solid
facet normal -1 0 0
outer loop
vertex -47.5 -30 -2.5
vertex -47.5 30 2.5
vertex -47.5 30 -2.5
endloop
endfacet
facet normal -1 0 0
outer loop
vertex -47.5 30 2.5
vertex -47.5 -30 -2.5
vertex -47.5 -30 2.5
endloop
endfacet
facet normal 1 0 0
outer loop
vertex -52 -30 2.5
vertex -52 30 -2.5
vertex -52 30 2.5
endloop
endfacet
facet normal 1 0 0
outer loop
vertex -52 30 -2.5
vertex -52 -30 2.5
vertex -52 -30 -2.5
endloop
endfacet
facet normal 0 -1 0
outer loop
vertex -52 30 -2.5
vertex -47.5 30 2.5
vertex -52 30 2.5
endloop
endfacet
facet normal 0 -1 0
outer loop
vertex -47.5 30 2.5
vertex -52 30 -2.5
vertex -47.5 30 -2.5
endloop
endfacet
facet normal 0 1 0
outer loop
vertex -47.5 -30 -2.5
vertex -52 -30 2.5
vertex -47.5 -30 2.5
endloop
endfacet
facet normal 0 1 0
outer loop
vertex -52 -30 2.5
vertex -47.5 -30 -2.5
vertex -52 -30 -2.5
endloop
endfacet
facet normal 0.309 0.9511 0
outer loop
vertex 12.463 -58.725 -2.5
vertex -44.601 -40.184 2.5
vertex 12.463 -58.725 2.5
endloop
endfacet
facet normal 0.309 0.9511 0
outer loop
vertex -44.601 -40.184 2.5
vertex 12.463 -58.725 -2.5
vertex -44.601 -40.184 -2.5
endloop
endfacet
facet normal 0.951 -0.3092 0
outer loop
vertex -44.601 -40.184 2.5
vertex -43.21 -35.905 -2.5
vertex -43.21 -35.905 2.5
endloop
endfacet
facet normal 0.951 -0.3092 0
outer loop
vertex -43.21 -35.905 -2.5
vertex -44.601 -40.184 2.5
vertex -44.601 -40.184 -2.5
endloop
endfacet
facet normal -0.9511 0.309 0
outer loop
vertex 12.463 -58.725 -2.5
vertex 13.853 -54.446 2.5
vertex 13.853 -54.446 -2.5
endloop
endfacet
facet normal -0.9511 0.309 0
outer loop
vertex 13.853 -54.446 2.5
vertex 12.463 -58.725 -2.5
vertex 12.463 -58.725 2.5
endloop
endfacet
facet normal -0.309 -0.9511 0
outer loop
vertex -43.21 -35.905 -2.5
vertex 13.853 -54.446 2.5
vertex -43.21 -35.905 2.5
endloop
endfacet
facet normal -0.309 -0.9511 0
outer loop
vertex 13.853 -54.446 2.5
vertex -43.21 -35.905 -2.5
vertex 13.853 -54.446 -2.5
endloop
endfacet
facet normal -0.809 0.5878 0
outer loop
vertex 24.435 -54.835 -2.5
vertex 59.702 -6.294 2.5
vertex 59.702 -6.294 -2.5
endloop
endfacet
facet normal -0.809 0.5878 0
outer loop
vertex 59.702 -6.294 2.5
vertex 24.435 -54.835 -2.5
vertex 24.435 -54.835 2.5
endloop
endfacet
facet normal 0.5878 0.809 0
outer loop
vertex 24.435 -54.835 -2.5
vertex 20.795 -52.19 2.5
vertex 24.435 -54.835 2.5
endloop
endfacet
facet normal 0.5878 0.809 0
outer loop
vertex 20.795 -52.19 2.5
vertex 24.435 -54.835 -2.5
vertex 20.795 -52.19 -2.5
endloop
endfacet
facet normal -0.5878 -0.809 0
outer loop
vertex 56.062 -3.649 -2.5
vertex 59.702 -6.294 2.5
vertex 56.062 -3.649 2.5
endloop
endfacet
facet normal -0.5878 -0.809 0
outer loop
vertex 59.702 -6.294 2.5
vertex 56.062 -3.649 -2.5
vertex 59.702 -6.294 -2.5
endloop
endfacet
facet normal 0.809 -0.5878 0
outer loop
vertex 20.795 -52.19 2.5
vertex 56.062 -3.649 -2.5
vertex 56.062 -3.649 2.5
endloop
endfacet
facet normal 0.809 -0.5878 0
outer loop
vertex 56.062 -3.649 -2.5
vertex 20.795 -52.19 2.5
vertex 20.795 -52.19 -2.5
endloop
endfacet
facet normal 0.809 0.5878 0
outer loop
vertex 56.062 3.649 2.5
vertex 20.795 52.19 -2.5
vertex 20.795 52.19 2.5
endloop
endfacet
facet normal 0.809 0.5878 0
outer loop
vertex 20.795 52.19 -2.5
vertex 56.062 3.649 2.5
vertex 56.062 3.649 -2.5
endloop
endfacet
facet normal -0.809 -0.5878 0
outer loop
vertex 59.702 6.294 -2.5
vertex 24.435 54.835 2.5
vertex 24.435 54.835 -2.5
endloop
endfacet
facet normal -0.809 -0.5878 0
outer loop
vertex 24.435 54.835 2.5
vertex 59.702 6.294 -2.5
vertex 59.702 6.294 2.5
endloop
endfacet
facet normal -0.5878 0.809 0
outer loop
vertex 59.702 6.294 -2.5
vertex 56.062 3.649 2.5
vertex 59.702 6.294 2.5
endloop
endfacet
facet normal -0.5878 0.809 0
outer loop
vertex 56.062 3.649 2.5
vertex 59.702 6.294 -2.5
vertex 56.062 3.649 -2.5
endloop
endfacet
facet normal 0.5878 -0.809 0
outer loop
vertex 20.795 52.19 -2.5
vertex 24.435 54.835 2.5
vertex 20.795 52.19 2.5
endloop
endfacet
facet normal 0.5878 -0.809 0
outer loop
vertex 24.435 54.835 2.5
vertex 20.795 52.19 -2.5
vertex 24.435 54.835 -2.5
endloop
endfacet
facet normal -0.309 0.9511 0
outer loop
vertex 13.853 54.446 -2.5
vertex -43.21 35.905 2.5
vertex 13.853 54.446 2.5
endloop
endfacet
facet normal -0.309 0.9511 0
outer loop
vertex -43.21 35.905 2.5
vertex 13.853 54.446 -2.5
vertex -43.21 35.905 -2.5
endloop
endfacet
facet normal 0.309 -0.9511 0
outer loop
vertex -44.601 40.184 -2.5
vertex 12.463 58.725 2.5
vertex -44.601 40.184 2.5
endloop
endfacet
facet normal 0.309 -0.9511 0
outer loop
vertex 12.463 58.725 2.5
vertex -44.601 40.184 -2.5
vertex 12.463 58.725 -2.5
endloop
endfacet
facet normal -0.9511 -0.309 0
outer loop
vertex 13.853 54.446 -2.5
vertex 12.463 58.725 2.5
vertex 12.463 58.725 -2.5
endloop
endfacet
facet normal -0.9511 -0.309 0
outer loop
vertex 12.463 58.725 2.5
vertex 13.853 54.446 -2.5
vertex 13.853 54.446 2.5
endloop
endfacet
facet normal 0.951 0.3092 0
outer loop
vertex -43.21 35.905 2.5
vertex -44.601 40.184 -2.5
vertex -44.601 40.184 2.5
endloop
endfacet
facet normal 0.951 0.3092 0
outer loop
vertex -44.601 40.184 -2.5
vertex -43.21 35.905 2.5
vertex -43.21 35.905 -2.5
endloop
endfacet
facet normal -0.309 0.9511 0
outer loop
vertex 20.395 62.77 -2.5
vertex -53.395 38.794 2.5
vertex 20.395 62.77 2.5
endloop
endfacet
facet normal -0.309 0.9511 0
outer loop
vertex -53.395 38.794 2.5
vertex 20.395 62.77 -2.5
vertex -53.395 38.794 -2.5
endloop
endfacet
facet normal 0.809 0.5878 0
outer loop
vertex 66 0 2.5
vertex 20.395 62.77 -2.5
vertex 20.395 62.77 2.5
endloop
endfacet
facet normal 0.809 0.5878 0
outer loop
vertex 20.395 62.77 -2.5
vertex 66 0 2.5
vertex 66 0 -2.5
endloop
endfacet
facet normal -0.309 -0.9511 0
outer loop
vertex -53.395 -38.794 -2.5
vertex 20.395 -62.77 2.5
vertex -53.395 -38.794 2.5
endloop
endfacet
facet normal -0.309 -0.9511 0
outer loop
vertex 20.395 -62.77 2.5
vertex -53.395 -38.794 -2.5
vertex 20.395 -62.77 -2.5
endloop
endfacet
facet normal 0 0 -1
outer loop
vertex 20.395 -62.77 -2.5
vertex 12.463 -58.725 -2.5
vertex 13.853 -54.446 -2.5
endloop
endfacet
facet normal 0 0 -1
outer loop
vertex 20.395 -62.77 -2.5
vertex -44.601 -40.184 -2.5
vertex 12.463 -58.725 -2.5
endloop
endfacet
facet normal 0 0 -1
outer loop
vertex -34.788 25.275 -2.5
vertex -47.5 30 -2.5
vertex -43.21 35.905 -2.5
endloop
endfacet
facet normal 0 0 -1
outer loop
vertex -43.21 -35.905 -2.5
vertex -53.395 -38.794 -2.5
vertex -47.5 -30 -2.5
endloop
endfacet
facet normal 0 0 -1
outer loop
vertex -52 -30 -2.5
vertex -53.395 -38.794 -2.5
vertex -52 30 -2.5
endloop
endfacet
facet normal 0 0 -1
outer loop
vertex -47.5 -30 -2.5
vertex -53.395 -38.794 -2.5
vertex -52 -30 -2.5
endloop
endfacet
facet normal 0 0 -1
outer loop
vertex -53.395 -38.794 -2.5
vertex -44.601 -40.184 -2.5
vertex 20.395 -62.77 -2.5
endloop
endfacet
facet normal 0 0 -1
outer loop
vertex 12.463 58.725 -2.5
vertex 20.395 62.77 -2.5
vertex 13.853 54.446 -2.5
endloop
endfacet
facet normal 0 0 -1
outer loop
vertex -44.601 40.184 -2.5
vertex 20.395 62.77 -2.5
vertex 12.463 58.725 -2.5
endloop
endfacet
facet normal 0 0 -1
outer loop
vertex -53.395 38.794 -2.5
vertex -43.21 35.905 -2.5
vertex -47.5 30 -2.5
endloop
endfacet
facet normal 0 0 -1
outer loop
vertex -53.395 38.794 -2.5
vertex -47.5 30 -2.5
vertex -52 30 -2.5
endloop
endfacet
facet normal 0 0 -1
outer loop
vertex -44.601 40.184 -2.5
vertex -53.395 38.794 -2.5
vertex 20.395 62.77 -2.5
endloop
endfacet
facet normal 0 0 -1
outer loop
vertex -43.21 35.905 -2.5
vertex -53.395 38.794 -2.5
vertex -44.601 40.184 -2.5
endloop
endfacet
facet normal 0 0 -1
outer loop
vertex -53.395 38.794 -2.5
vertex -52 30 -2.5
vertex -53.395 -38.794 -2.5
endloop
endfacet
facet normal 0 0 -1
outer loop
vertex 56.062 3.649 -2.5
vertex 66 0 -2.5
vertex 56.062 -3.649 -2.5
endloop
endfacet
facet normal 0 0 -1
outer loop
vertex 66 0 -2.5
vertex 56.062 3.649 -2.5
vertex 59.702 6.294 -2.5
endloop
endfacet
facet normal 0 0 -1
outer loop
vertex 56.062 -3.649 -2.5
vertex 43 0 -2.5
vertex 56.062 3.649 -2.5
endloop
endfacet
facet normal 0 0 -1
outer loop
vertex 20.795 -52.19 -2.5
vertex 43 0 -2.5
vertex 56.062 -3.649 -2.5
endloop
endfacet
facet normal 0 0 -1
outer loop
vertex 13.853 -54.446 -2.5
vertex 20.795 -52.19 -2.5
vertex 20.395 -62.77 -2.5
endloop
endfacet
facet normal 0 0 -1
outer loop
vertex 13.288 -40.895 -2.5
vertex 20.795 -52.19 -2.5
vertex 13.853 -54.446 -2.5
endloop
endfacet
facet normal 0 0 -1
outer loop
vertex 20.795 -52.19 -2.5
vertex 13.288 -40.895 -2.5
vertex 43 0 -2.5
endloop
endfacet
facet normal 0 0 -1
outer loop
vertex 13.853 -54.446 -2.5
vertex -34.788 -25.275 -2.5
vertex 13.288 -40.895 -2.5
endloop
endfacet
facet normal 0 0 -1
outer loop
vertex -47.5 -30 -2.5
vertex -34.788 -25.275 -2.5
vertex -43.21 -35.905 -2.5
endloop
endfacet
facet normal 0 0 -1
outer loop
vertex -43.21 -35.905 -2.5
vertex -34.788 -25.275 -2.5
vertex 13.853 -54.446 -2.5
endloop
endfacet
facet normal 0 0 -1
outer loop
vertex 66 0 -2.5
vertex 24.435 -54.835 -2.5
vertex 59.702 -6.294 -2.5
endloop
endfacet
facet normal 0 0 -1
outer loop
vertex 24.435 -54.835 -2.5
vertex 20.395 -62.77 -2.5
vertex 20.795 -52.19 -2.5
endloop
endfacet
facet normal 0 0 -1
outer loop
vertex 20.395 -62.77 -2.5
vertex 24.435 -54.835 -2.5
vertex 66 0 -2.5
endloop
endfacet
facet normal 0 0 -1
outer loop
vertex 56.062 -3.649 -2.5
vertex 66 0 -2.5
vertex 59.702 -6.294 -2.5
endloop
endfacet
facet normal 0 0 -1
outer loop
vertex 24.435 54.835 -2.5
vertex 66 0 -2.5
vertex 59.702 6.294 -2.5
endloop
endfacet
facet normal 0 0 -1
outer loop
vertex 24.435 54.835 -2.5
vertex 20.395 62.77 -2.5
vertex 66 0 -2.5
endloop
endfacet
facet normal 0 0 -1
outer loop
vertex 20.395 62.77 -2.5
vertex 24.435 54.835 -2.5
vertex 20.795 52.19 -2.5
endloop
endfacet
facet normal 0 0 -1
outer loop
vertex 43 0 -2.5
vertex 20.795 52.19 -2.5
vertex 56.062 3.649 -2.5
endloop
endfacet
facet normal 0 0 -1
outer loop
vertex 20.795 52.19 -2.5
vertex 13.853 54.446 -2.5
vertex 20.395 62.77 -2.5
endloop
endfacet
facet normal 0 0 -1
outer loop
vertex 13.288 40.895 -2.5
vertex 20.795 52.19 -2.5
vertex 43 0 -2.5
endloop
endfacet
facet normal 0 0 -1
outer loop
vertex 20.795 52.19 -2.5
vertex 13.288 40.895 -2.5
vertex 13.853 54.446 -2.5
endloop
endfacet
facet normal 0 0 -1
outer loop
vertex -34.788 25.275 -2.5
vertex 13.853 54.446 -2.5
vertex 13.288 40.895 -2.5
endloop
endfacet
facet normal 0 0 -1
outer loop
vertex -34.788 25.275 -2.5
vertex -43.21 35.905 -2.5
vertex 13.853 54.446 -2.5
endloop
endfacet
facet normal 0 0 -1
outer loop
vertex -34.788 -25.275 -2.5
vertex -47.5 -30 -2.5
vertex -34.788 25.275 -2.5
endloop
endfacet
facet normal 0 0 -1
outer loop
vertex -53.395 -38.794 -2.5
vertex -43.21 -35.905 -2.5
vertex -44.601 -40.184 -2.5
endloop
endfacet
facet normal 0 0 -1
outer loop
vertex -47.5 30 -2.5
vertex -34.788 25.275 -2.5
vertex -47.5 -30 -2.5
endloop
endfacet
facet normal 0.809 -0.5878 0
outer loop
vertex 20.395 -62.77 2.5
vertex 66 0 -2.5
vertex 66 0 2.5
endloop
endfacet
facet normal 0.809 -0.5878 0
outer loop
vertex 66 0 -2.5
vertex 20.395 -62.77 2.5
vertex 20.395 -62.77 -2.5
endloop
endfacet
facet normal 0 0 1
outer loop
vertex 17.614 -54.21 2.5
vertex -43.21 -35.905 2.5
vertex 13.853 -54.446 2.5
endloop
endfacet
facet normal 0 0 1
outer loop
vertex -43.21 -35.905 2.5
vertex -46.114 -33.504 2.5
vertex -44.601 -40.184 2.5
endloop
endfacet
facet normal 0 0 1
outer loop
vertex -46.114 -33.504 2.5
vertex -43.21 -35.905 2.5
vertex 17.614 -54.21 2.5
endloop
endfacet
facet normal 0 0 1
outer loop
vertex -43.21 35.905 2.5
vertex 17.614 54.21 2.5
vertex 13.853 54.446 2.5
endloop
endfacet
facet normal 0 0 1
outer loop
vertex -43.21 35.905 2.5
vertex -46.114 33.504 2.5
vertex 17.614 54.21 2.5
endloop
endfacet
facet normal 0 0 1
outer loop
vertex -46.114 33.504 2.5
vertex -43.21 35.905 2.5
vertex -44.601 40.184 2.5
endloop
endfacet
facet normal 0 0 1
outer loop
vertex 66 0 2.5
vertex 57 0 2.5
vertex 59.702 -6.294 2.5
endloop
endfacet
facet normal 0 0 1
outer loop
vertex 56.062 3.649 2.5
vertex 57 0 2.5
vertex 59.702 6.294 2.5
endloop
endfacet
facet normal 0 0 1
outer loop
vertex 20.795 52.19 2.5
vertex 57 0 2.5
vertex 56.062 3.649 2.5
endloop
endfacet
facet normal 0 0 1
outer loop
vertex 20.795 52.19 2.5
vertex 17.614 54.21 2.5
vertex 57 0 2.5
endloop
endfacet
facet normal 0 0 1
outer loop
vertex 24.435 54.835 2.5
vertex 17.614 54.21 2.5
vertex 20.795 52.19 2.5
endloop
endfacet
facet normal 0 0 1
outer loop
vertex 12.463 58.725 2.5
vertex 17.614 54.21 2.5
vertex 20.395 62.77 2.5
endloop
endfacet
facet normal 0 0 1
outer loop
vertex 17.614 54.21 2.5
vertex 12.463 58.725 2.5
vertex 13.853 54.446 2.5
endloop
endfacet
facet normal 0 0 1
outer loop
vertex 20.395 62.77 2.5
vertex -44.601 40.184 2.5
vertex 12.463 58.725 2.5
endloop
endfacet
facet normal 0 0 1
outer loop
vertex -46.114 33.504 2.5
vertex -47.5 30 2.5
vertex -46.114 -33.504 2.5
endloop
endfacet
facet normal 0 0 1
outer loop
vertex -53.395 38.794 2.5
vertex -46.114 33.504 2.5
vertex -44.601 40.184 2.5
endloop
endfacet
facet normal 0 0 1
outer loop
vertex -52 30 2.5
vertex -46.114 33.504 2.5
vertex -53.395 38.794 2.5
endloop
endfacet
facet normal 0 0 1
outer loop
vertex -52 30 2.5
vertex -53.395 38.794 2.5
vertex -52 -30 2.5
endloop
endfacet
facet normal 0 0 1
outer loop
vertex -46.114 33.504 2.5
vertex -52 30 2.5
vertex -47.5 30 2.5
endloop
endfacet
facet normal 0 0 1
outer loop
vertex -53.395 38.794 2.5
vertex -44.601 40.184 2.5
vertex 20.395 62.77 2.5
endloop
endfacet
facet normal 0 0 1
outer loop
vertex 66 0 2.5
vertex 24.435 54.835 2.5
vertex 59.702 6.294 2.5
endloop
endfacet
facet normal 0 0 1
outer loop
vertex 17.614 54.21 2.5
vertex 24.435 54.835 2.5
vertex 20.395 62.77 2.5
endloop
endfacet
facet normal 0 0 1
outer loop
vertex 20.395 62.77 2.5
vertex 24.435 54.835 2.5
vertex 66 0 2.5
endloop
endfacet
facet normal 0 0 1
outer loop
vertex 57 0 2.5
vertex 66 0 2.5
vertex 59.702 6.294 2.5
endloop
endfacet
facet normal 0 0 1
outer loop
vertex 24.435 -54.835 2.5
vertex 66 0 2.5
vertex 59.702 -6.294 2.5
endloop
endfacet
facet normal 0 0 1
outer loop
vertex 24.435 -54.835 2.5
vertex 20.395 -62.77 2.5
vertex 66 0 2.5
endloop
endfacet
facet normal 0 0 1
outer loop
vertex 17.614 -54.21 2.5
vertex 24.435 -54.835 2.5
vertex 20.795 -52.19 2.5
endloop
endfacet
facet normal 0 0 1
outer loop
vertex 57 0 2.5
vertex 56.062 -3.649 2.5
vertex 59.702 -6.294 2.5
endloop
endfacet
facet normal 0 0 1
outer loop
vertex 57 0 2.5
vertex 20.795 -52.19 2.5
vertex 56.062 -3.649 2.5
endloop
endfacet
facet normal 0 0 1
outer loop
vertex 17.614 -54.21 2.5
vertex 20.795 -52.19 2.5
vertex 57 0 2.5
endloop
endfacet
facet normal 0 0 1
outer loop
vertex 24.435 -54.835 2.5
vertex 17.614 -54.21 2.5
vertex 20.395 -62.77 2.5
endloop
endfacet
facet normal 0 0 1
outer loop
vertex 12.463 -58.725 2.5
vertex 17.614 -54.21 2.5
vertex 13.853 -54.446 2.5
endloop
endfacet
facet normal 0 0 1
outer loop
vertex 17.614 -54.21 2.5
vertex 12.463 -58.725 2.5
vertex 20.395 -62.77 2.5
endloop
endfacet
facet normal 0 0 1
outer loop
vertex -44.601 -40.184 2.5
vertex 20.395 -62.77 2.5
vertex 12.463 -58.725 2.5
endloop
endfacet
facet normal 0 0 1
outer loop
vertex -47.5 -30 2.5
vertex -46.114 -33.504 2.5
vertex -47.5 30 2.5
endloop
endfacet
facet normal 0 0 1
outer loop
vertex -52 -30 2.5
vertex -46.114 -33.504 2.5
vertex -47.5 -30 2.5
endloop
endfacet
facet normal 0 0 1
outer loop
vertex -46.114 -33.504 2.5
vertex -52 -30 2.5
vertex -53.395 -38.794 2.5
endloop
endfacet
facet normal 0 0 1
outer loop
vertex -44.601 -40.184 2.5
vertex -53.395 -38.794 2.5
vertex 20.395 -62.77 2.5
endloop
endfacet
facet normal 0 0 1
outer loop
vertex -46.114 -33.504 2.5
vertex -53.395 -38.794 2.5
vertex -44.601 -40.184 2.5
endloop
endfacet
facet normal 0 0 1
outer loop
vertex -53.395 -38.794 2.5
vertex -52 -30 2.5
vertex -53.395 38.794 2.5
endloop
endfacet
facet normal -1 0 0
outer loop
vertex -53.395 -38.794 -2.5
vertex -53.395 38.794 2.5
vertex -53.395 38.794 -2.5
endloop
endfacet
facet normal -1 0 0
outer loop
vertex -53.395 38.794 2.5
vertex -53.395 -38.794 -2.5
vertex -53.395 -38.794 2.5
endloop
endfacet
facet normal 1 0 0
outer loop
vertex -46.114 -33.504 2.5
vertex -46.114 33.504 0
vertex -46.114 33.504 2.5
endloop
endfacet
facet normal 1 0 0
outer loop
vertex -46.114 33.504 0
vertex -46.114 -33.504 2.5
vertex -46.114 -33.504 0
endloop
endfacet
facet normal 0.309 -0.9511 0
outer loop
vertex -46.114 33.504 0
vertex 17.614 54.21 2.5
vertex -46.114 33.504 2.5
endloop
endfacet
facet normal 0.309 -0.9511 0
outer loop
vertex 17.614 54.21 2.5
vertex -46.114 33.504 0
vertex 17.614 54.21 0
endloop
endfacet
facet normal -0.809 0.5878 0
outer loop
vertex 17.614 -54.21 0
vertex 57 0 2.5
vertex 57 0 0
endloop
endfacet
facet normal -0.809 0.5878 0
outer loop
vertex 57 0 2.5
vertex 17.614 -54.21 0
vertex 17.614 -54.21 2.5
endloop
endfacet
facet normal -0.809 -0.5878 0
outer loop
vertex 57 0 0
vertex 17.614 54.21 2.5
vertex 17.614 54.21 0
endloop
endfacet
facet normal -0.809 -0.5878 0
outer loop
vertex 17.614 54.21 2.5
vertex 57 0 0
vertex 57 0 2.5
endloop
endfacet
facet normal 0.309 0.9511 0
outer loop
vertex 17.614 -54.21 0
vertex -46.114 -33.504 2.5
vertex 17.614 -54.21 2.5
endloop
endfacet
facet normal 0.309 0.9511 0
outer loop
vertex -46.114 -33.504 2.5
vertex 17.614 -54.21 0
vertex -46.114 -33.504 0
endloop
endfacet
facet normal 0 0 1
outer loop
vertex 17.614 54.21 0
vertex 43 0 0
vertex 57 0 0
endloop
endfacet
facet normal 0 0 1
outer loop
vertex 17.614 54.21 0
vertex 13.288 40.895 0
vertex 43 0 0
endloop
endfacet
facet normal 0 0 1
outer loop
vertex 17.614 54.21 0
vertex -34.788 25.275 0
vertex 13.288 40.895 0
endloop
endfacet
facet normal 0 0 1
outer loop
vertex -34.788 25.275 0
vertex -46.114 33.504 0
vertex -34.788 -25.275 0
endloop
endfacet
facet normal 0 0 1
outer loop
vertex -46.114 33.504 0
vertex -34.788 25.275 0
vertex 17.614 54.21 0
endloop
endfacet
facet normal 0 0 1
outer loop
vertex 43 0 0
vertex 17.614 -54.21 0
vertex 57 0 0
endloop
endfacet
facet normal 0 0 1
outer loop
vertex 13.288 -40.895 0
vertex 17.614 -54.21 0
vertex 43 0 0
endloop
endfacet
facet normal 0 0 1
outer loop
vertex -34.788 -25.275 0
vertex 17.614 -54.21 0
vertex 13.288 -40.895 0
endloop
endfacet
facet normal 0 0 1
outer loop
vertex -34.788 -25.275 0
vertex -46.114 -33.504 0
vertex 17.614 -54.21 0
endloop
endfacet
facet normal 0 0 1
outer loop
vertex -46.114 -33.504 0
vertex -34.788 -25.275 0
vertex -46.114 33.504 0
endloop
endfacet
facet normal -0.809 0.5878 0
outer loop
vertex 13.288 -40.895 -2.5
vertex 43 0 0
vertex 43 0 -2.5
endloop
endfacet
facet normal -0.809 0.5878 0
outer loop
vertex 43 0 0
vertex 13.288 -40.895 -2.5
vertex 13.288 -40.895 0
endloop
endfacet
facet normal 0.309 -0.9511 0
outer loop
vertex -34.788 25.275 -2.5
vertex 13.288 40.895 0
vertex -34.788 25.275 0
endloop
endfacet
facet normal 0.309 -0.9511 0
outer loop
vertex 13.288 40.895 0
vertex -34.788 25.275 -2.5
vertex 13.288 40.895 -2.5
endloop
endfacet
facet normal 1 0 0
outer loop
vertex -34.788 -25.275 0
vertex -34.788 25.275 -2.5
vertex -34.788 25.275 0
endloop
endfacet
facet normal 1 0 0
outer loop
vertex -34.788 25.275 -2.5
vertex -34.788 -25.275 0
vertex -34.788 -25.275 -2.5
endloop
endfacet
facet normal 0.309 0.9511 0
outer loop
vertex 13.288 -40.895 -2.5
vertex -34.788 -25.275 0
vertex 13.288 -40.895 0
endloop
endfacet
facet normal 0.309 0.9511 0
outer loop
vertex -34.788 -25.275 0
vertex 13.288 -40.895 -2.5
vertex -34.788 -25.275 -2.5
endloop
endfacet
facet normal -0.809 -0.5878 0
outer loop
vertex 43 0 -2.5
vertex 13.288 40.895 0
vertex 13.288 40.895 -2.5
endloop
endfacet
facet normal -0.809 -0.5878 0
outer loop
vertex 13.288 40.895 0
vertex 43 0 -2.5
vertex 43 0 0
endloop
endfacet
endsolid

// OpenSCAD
angle = 360 / 5;

module pentagon(radius) {
    angles = [for(i = [0 : 4]) i * angle];
    coords = [for(th = angles) [radius * cos(th), radius * sin(th)]];
    polygon(coords);
}

module pentagonoid(height, radius) {
 linear_extrude(height = height , center = true)
 pentagon(radius = radius);
}

difference() {
  pentagonoid(height = 5, radius = 66);

  for(i = [0 : 4]) {
    rotate(a = angle * i) 
    translate(v = [-49.75, 0, 0])
    cube(size = [4.5, 60, 6], center = true); 
 }

  translate(v = [0, 0, 3])
  pentagonoid(height = 6, radius = 57);
  pentagonoid(height = 10, radius = 43);
}
